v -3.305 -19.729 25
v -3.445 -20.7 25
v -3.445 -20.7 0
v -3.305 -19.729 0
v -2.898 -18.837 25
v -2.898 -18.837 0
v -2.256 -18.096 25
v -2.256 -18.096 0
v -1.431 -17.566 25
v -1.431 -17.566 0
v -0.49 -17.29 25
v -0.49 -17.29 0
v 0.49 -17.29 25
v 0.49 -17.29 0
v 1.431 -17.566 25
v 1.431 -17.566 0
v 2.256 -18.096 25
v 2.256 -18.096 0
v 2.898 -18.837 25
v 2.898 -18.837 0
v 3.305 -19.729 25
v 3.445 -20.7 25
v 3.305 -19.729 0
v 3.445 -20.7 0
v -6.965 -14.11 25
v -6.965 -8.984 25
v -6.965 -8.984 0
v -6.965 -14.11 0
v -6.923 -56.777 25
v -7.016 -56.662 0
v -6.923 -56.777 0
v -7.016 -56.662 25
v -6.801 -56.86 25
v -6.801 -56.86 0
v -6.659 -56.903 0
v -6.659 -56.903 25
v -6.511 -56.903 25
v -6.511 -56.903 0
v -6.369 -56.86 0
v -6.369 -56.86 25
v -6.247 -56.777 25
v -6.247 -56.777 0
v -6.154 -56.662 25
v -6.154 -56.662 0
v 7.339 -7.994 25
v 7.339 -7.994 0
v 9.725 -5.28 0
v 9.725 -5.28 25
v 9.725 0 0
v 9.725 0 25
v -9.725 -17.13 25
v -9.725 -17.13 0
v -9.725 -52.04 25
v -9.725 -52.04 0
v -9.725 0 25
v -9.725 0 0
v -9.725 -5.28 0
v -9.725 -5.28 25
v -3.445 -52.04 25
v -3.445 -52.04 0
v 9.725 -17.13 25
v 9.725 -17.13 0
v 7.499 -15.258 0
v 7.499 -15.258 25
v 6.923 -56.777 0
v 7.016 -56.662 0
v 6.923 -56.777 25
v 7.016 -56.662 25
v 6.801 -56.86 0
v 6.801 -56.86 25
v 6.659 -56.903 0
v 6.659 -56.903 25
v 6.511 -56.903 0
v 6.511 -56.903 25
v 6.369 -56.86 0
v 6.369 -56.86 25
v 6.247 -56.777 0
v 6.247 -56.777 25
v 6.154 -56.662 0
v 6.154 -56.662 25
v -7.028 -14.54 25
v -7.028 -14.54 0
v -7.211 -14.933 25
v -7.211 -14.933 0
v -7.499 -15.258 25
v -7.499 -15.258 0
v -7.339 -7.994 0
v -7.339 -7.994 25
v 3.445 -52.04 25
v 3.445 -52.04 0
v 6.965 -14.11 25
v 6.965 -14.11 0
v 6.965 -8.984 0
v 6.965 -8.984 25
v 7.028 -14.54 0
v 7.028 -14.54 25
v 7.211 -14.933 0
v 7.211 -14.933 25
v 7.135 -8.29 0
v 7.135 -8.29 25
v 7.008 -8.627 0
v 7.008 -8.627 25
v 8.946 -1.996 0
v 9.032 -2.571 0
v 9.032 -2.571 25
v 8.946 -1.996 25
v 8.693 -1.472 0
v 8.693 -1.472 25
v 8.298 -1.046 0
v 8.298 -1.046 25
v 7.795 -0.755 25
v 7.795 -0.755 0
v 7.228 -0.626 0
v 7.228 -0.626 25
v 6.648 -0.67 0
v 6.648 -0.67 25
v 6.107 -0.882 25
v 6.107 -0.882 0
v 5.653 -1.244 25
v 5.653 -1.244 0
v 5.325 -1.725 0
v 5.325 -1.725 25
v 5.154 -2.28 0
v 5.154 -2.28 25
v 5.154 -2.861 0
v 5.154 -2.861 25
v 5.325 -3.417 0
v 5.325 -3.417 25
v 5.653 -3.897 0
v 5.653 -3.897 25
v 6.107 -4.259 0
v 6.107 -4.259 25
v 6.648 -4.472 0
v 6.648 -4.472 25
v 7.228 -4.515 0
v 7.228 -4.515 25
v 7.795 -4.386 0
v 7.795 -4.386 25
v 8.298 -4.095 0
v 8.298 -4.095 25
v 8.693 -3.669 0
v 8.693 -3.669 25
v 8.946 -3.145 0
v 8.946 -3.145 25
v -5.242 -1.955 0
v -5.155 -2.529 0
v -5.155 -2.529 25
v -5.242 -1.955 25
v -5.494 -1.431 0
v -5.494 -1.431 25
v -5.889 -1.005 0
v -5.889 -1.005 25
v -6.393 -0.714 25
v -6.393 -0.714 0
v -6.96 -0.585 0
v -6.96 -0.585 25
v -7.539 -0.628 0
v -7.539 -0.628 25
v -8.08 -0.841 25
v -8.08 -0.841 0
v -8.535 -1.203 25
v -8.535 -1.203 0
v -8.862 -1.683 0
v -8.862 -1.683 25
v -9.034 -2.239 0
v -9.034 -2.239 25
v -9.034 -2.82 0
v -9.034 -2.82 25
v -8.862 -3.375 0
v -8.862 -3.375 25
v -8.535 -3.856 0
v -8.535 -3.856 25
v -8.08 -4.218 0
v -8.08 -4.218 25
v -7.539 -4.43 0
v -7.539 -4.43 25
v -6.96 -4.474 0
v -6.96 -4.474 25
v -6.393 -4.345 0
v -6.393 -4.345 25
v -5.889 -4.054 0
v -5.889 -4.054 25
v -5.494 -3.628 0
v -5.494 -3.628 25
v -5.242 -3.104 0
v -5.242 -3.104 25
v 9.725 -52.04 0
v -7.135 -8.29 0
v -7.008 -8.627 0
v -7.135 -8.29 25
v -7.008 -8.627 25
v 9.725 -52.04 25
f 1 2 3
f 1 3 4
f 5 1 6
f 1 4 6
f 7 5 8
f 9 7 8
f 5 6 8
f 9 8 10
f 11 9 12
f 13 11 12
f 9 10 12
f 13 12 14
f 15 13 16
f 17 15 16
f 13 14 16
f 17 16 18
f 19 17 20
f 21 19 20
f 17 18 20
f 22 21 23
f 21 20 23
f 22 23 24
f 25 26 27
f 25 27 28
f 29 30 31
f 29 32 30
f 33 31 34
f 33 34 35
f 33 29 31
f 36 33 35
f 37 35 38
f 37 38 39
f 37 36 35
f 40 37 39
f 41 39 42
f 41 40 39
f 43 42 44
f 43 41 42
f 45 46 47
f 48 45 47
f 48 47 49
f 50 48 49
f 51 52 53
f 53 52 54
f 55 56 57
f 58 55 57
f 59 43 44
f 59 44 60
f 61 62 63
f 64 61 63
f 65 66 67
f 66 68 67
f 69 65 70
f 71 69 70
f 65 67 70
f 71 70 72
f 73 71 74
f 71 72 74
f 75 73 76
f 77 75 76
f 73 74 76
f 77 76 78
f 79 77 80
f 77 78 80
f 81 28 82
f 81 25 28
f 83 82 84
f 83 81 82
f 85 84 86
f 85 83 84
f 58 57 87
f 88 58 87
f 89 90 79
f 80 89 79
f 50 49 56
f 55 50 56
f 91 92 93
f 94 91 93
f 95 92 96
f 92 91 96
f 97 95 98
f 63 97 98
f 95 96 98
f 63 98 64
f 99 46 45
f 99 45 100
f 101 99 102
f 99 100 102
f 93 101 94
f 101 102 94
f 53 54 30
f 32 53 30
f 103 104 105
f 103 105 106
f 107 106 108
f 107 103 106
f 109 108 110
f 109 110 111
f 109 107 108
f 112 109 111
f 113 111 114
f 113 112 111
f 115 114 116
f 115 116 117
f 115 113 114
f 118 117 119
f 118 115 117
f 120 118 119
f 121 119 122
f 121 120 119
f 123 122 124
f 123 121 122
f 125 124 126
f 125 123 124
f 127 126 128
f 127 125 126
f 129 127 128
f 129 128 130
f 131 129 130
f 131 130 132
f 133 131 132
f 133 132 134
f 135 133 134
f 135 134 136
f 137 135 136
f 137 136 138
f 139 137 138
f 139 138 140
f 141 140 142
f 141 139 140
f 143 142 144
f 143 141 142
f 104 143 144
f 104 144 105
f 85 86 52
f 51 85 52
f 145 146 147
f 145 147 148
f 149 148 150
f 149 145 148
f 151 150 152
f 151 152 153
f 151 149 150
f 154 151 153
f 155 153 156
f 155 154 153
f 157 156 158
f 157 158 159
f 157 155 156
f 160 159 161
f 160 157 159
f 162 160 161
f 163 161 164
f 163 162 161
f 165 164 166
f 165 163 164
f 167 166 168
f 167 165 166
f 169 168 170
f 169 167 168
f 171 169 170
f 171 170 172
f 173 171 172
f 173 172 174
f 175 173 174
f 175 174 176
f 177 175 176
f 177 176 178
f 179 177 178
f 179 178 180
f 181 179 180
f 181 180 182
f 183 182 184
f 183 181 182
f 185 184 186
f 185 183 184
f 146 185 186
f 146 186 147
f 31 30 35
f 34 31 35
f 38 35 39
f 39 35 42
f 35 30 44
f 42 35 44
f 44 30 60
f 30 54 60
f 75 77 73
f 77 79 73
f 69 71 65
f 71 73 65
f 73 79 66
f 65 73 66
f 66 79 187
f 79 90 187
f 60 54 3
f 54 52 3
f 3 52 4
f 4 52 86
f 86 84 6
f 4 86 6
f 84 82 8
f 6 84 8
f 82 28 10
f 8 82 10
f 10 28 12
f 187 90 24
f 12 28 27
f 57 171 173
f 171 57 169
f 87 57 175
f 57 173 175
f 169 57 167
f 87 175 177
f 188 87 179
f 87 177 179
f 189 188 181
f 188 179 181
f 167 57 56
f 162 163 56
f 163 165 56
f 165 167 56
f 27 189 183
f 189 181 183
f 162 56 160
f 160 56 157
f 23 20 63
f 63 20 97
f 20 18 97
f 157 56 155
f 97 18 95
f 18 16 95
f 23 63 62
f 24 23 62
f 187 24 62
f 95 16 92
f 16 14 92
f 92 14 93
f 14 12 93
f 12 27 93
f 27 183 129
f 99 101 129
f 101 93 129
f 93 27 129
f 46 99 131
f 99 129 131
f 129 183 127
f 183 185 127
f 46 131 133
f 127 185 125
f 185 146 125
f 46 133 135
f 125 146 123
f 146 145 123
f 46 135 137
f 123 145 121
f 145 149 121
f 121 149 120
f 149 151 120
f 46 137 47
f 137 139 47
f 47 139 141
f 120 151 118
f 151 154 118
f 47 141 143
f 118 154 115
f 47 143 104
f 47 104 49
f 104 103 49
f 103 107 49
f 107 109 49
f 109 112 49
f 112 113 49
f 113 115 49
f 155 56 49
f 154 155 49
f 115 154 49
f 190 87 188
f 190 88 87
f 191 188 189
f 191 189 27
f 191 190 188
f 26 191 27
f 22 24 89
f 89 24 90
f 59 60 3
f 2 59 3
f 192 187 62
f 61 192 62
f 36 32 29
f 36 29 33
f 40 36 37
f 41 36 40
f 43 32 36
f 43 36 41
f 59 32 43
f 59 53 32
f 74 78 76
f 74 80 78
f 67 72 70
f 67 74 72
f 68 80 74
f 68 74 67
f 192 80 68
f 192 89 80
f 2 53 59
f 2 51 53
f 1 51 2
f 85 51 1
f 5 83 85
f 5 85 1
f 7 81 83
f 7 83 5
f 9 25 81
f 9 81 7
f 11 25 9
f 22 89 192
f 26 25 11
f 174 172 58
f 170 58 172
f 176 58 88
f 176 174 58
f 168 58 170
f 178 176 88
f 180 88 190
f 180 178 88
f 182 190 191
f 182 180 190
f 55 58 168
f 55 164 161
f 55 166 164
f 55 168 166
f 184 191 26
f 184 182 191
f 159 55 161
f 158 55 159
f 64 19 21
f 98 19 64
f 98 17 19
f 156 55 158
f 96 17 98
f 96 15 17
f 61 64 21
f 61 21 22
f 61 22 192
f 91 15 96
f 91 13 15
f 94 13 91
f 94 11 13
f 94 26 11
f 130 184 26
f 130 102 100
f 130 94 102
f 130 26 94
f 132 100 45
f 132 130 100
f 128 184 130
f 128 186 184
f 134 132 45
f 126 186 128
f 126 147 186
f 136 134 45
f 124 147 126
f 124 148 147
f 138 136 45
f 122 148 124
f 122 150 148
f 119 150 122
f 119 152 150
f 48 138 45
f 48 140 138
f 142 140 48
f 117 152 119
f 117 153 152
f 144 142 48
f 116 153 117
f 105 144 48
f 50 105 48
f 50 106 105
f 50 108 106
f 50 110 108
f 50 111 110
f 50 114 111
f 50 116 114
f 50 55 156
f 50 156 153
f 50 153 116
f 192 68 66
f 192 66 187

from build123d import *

# Parameters (mm, degrees)
F0_R     = 1.95
F1_DEPTH = 25
F2_R     = 1.5
F3_R     = 0.5


with BuildPart() as f1:
    # F0 (on Top) → F1 (new body)
    with BuildSketch(Plane.XY):
        with BuildLine():
            Line((9.725, 0), (0, 0))
            Line((0, 0), (-9.725, 0))
            Line((-9.725, 0), (-9.725, -5.28))
            Line((-9.725, -5.28), (-6.965, -8.418538))
            Line((-6.965, -8.418538), (-6.965, -14.808538))
            Line((-6.965, -14.808538), (-9.725, -17.13))
            Line((-9.725, -17.13), (-9.725, -52.04))
            Line((-9.725, -52.04), (-6.585, -57.397658))
            Line((-6.585, -57.397658), (-3.445, -52.04))
            Line((-3.445, -52.04), (-3.445, -20.7))
            ThreePointArc((-3.445, -20.7), (0, -17.255), (3.445, -20.7))
            Line((3.445, -20.7), (3.445, -52.04))
            Line((3.445, -52.04), (6.585, -57.397658))
            Line((6.585, -57.397658), (9.725, -52.04))
            Line((9.725, -52.04), (9.725, -17.13))
            Line((9.725, -17.13), (6.965, -14.808538))
            Line((6.965, -14.808538), (6.965, -8.418538))
            Line((6.965, -8.418538), (9.725, -5.28))
            Line((9.725, -5.28), (9.725, 0))
        make_face()
        with Locations((-7.105281, -2.529315)):
            Circle(F0_R, mode=Mode.SUBTRACT)
        with Locations((7.082135, -2.570621)):
            Circle(F0_R, mode=Mode.SUBTRACT)
    extrude(amount=F1_DEPTH)

    # F2
    f2_edges = [f1.edges().sort_by_distance(p)[0] for p in [
        (6.965, -8.418538, 12.5),
        (6.965, -14.808538, 12.5),
        (-6.965, -8.418538, 12.5),
        (-6.965, -14.808538, 12.5),
    ]]
    fillet(f2_edges, radius=F2_R)

    # F3
    f3_edges = [f1.edges().sort_by_distance(p)[0] for p in [
        (-6.585, -57.397658, 12.5),
        (6.585, -57.397658, 12.5),
    ]]
    fillet(f3_edges, radius=F3_R)


solid = f1.part
